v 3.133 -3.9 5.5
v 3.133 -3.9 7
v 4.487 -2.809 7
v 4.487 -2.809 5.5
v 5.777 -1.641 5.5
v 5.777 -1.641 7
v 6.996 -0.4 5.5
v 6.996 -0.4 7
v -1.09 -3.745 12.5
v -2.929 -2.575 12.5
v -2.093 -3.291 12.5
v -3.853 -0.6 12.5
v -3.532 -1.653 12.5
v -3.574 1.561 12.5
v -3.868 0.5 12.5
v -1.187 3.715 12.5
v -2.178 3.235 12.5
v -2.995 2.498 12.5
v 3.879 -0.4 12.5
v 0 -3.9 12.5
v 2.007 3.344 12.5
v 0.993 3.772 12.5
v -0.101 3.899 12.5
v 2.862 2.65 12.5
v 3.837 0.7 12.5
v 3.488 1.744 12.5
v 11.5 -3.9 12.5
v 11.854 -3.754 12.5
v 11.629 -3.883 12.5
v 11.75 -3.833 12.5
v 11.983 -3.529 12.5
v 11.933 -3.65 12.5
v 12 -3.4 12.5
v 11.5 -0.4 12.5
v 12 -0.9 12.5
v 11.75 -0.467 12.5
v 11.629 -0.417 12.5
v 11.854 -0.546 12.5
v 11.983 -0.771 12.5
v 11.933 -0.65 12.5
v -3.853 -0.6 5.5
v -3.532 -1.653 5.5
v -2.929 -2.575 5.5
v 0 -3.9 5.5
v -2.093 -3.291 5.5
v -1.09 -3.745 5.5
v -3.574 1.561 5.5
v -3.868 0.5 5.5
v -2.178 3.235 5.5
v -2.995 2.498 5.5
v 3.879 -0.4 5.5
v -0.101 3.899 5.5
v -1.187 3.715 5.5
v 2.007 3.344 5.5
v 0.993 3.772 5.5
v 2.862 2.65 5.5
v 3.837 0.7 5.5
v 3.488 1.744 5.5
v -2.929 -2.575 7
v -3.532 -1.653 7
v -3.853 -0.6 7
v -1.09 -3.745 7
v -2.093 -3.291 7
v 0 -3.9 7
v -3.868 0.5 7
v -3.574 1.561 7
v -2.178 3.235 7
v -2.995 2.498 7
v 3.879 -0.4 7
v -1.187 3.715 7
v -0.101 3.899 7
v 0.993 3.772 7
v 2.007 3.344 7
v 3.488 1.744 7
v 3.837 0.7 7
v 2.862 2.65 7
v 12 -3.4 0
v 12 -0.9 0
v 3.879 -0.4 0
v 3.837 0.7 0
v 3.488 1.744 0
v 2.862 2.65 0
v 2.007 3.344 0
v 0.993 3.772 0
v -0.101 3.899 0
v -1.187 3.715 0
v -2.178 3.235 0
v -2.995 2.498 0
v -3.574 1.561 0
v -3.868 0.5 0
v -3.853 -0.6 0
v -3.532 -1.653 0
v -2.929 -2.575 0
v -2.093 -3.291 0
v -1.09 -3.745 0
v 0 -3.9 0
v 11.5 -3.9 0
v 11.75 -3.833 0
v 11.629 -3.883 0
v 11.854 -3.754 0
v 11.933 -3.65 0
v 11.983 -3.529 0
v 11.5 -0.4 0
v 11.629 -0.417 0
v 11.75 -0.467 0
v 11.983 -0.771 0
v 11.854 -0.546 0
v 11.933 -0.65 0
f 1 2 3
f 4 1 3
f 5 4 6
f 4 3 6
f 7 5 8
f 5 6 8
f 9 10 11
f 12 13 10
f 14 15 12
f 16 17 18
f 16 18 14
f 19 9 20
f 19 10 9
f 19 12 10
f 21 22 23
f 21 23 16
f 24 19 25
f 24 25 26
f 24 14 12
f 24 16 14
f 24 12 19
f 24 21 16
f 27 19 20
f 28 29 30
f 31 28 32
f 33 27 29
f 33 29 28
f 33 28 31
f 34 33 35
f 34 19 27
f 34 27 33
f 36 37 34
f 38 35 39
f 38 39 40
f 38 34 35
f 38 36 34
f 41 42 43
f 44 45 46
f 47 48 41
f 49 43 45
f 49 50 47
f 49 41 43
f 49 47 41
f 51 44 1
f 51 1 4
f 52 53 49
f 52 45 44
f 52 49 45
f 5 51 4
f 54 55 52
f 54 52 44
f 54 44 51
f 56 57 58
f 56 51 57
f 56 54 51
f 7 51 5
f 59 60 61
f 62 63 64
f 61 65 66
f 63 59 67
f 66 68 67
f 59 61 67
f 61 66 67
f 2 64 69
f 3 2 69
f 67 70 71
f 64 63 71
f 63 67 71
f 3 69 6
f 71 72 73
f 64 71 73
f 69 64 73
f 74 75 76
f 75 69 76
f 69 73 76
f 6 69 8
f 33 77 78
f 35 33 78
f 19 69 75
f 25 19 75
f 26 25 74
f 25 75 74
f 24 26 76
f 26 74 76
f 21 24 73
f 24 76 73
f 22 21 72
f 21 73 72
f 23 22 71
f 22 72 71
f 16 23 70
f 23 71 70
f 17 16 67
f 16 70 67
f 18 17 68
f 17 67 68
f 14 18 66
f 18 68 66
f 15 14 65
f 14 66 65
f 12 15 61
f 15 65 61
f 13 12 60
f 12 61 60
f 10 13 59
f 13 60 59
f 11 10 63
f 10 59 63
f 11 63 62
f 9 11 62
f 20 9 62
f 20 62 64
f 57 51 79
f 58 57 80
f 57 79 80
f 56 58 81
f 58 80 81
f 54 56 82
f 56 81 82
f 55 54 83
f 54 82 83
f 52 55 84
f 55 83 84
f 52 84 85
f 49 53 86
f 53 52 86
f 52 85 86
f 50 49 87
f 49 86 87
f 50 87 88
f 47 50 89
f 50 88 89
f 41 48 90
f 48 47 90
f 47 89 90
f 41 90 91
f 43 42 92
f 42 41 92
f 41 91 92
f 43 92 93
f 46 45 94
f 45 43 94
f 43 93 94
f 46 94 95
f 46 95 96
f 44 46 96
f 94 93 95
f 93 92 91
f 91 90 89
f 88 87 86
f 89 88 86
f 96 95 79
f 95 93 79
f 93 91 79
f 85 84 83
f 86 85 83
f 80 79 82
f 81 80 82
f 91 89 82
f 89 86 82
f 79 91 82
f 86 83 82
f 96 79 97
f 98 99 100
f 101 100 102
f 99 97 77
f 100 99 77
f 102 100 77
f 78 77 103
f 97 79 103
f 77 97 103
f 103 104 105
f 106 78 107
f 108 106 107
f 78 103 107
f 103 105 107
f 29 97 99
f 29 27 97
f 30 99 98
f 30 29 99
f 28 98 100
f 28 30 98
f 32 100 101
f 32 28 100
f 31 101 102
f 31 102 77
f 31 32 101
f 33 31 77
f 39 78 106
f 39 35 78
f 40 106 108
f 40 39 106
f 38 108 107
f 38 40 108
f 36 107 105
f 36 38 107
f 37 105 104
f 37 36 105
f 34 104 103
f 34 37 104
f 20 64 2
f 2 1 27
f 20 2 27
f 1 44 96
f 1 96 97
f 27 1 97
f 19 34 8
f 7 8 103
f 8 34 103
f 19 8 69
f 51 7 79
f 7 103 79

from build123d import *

# Parameters (mm, degrees)
BASE_EXTRUSION_DEPTH    = 12.5
CONG_1_R                = 0.5
ESQUISSE2_R             = 30
ENL_V_MAT_EXTRU_1_DEPTH = 1.5


with BuildPart() as part:
    # Esquisse1 → Base-Extrusion (new body)
    with BuildSketch(Plane.XY):
        with BuildLine():
            Line((0, -3.9), (12, -3.9))
            Line((12, -3.9), (12, -0.4))
            Line((12, -0.4), (3.879432948, -0.4))
            ThreePointArc((3.879432948, -0.4), (-2.612470096, 2.895686447), (0, -3.9))
        make_face()
    extrude(amount=BASE_EXTRUSION_DEPTH)

    # Congé1
    cong_1_edges = [part.edges().sort_by_distance(p)[0] for p in [
        (12, -3.9, 6.25),
        (12, -0.4, 6.25),
    ]]
    fillet(cong_1_edges, radius=CONG_1_R)

    # Esquisse2 → Enlèv. mat.-Extru.1 (cut)
    with BuildSketch(Plane.XY.offset(7)):
        with Locations((-15, 20)):
            Circle(ESQUISSE2_R)
    extrude(amount=-ENL_V_MAT_EXTRU_1_DEPTH, mode=Mode.SUBTRACT)


solid = part.part
